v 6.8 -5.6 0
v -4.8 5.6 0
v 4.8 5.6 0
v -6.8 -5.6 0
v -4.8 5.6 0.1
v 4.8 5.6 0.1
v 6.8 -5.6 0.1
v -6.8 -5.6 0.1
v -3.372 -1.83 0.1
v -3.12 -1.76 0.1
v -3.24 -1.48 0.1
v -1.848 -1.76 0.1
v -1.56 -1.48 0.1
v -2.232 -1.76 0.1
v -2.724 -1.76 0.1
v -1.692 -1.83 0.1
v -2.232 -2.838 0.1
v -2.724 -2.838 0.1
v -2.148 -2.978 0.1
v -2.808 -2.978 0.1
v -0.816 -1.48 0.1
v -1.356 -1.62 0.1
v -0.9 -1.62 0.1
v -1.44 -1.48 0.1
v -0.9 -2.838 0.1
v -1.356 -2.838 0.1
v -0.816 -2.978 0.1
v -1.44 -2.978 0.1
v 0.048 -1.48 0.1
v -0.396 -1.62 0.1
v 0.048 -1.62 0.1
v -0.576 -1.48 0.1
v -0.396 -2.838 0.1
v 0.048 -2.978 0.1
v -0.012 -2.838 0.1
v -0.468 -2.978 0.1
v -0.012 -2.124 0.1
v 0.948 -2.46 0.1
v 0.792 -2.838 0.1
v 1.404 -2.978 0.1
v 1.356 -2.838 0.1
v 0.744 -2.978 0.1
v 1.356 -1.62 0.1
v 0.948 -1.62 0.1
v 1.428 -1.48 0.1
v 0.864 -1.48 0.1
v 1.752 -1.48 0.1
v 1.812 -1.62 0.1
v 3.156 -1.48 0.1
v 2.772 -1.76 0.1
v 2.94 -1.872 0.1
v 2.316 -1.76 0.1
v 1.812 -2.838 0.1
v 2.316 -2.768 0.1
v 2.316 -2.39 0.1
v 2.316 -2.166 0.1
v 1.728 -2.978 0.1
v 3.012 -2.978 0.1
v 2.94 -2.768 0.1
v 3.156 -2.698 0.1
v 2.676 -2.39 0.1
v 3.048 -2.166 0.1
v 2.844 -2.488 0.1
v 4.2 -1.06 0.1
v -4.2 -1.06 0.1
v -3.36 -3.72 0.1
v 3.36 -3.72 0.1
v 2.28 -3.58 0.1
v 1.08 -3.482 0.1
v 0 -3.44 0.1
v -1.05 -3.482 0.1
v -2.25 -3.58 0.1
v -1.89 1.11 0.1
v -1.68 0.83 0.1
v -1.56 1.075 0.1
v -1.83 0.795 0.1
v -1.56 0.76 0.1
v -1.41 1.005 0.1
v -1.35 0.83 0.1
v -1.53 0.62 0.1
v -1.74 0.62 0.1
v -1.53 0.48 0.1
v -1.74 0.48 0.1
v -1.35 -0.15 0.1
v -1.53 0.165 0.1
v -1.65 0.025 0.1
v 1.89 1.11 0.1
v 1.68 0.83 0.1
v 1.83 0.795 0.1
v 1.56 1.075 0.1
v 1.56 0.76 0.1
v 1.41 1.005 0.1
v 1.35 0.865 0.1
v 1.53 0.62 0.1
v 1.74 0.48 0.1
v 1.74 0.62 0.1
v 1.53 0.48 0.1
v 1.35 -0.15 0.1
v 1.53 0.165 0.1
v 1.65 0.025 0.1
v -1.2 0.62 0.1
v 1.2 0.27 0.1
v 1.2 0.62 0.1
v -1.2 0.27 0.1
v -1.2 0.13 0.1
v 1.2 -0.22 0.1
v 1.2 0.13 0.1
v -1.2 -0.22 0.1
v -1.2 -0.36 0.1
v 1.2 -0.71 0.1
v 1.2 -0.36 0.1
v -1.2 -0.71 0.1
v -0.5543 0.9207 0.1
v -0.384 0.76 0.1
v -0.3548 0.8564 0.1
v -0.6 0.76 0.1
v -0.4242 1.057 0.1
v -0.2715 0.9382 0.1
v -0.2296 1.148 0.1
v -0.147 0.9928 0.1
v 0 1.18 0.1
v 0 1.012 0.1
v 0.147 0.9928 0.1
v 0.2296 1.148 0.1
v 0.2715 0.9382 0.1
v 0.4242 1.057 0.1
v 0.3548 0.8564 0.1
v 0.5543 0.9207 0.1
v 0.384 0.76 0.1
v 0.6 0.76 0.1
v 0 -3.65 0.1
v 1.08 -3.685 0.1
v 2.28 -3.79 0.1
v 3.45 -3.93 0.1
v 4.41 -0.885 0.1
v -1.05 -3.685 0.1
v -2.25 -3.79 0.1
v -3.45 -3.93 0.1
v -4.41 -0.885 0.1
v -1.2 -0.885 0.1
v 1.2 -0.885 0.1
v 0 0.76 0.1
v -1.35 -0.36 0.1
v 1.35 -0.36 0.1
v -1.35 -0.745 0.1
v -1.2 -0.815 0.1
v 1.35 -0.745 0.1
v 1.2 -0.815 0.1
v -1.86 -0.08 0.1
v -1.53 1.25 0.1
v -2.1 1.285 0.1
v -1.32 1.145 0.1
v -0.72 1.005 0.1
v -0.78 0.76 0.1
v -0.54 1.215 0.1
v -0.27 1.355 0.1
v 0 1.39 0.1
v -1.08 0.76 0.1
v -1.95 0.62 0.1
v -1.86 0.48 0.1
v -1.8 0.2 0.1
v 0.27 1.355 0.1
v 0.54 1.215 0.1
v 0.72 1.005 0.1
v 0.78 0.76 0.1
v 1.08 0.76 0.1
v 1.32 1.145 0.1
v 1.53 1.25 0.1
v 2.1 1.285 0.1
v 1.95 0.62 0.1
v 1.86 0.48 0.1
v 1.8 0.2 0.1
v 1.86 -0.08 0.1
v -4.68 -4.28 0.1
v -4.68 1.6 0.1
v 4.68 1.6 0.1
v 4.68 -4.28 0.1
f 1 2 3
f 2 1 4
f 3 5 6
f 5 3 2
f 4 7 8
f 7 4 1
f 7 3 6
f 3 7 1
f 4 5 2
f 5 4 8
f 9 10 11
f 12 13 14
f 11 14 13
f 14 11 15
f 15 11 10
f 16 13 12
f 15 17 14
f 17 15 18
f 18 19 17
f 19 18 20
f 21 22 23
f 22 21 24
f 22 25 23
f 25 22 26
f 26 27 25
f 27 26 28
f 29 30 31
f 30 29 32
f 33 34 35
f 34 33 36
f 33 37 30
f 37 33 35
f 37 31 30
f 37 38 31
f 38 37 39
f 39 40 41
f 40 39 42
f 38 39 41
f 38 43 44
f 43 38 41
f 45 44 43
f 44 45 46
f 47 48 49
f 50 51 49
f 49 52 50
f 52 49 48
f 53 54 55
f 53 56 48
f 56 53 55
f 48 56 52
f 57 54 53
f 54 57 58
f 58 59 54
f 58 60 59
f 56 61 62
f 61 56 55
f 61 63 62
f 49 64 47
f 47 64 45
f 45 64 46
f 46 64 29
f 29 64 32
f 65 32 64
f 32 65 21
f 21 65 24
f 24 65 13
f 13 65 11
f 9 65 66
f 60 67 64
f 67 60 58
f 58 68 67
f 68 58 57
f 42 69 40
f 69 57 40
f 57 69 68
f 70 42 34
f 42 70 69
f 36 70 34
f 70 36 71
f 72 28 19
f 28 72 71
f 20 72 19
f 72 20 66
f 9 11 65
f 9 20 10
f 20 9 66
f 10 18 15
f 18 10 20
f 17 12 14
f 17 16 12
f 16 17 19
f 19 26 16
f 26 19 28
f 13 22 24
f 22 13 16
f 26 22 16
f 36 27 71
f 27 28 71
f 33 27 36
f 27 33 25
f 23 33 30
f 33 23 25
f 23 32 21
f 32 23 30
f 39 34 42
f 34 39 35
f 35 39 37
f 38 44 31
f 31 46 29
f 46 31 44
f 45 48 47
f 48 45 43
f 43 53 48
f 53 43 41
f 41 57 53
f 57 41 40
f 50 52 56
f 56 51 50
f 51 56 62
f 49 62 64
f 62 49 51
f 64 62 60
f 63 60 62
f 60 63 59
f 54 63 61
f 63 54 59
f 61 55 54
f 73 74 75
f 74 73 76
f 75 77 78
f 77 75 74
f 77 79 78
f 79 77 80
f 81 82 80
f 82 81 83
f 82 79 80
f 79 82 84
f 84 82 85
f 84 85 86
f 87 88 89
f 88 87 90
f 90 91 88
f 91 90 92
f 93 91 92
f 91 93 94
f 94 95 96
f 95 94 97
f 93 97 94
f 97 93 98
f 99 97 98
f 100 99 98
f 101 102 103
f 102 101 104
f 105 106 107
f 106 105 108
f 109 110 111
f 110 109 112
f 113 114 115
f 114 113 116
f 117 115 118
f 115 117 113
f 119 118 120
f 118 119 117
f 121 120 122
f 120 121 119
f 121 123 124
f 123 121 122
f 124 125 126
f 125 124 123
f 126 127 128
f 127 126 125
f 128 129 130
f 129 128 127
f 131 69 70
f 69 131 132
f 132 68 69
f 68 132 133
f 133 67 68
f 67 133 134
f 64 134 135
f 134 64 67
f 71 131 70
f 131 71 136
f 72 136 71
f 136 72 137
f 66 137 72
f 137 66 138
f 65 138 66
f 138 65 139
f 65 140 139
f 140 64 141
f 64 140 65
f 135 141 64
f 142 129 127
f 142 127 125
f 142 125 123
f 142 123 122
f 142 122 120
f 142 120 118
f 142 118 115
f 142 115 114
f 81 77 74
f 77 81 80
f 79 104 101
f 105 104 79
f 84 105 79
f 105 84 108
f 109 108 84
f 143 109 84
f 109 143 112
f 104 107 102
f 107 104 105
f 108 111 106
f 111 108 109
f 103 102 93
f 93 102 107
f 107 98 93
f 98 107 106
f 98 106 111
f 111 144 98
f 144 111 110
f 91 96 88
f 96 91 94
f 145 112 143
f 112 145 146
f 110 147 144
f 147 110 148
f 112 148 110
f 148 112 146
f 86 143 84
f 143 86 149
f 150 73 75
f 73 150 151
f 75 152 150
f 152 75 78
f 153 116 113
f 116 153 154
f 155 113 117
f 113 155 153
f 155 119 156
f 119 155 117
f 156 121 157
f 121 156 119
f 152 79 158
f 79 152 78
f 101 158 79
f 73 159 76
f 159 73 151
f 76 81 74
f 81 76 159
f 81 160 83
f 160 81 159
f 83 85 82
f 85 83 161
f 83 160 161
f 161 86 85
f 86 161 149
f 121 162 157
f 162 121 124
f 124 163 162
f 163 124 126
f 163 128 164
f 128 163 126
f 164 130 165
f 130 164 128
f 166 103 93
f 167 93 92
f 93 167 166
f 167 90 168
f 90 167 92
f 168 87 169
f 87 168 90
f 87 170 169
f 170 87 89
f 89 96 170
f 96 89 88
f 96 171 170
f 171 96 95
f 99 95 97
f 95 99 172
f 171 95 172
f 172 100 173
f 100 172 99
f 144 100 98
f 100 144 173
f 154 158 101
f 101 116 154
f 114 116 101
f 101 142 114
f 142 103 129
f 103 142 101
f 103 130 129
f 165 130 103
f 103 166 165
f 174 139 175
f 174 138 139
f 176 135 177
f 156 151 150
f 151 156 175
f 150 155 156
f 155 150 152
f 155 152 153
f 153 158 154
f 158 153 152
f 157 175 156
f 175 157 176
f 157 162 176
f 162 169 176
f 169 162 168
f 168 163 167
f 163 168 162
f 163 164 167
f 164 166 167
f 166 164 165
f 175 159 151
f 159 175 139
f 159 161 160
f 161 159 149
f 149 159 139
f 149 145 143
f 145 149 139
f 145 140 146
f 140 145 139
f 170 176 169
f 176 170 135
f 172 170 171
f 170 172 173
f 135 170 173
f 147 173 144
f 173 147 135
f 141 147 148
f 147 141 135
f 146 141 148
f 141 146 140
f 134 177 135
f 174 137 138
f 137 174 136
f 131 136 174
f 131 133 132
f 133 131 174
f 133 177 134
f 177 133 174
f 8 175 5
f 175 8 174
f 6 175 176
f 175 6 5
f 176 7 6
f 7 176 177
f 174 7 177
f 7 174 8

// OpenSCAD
// file: ../p/2-4disc.scad
use <../lib.scad>
function ldraw_lib__2_4disc() = [
// 0 Disc 0.5
// 0 Name: 2-4disc.dat
// 0 Author: James Jessiman
// 0 !LDRAW_ORG Primitive UPDATE 2002-02
// 0 !LICENSE Licensed under CC BY 2.0 and CC BY 4.0 : see CAreadme.txt
// 
// 0 BFC CERTIFY CCW
  [0,"BFC","CERTIFY"],
  [0,"BFC","CCW"],
// 
// 0 !HISTORY 1998-12-15 [PTadmin] Official Update 1998-10
// 0 !HISTORY 2002-03-23 [sbliss] Added BFC statement
// 0 !HISTORY 2002-04-25 [PTadmin] Official Update 2002-02
// 0 !HISTORY 2007-06-24 [PTadmin] Header formatted for Contributor Agreement
// 0 !HISTORY 2008-07-01 [PTadmin] Official Update 2008-01
// 
// 
// 3 16 0 0 0 1 0 0 0.9239 0 0.3827
  [3,16,0,0,0,1,0,0,0.9239,0,0.3827],
// 3 16 0 0 0 0.9239 0 0.3827 0.7071 0 0.7071
  [3,16,0,0,0,0.9239,0,0.3827,0.7071,0,0.7071],
// 3 16 0 0 0 0.7071 0 0.7071 0.3827 0 0.9239
  [3,16,0,0,0,0.7071,0,0.7071,0.3827,0,0.9239],
// 3 16 0 0 0 0.3827 0 0.9239 0 0 1
  [3,16,0,0,0,0.3827,0,0.9239,0,0,1],
// 3 16 0 0 0 0 0 1 -0.3827 0 0.9239
  [3,16,0,0,0,0,0,1,-0.3827,0,0.9239],
// 3 16 0 0 0 -0.3827 0 0.9239 -0.7071 0 0.7071
  [3,16,0,0,0,-0.3827,0,0.9239,-0.7071,0,0.7071],
// 3 16 0 0 0 -0.7071 0 0.7071 -0.9239 0 0.3827
  [3,16,0,0,0,-0.7071,0,0.7071,-0.9239,0,0.3827],
// 3 16 0 0 0 -0.9239 0 0.3827 -1 0 -0
  [3,16,0,0,0,-0.9239,0,0.3827,-1,0,-0],
// 0
];
module ldraw_lib__2_4disc(step=0, col=false, unit=2/5, alt=false, line=0.2, solid=!$preview)
    makepoly(ldraw_lib__2_4disc(), step=step, col=col, unit=unit, alt=alt, line=line, solid=solid);
ldraw_lib__2_4disc(line=0.2);
// main file
use <../lib.scad>
use <s/22587s01.scad>
function ldraw_lib__22587c() = [
// 0 Sticker Minifig Torso with Large "TINE" Logo
// 0 Name: 22587c.dat
// 0 Author: J.C. Tchang [tchang]
// 0 !LDRAW_ORG Part UPDATE 2013-02
// 0 !LICENSE Licensed under CC BY 2.0 and CC BY 4.0 : see CAreadme.txt
// 
// 0 BFC CERTIFY CCW
  [0,"BFC","CERTIFY"],
  [0,"BFC","CCW"],
// 
// 0 !KEYWORDS Milk, set 1029
// 
// 0 !HISTORY 2007-12-10 [tchang] Used subpart and replace 4125514c
// 0 !HISTORY 2011-08-01 [tchang] Change title, used main color in back, suppress Category
// 0 !HISTORY 2013-08-07 [MMR1988] Adjusted Subpart Origin, Updated Description and Keywords
// 0 !HISTORY 2013-12-23 [PTadmin] Official Update 2013-02
// 
// 
// 4 16 17 0 -14 -17 0 -14 -12 0 14 12 0 14
  [4,16,17,0,-14,-17,0,-14,-12,0,14,12,0,14],
// 4 16 12 0 14 -12 0 14 -12 -0.25 14 12 -0.25 14
  [4,16,12,0,14,-12,0,14,-12,-0.25,14,12,-0.25,14],
// 4 16 17 -0.25 -14 -17 -0.25 -14 -17 0 -14 17 0 -14
  [4,16,17,-0.25,-14,-17,-0.25,-14,-17,0,-14,17,0,-14],
// 4 16 17 0 -14 12 0 14 12 -0.25 14 17 -0.25 -14
  [4,16,17,0,-14,12,0,14,12,-0.25,14,17,-0.25,-14],
// 4 16 -17 -0.25 -14 -12 -0.25 14 -12 0 14 -17 0 -14
  [4,16,-17,-0.25,-14,-12,-0.25,14,-12,0,14,-17,0,-14],
// 0 //
// 1 1 0 -0.25 -3.35 1 0 0 0 1 0 0 0 1 s\22587s01.dat
  [1,1,0,-0.25,-3.35,1,0,0,0,1,0,0,0,1, ldraw_lib__s__22587s01()],
// 0 //
// 4 1 -11.7 -0.25 4 -12 -0.25 14 -17 -0.25 -14 -11.7 -0.25 -10.7
  [4,1,-11.7,-0.25,4,-12,-0.25,14,-17,-0.25,-14,-11.7,-0.25,-10.7],
// 4 1 11.7 -0.25 4 12 -0.25 14 -12 -0.25 14 -11.7 -0.25 4
  [4,1,11.7,-0.25,4,12,-0.25,14,-12,-0.25,14,-11.7,-0.25,4],
// 4 1 11.7 -0.25 -10.7 17 -0.25 -14 12 -0.25 14 11.7 -0.25 4
  [4,1,11.7,-0.25,-10.7,17,-0.25,-14,12,-0.25,14,11.7,-0.25,4],
// 4 1 -11.7 -0.25 -10.7 -17 -0.25 -14 17 -0.25 -14 11.7 -0.25 -10.7
  [4,1,-11.7,-0.25,-10.7,-17,-0.25,-14,17,-0.25,-14,11.7,-0.25,-10.7],
];
module ldraw_lib__22587c(step=0, col=false, unit=2/5, alt=false, line=0.2, solid=!$preview)
    makepoly(ldraw_lib__22587c(), step=step, col=col, unit=unit, alt=alt, line=line, solid=solid);
ldraw_lib__22587c(line=0.2);
